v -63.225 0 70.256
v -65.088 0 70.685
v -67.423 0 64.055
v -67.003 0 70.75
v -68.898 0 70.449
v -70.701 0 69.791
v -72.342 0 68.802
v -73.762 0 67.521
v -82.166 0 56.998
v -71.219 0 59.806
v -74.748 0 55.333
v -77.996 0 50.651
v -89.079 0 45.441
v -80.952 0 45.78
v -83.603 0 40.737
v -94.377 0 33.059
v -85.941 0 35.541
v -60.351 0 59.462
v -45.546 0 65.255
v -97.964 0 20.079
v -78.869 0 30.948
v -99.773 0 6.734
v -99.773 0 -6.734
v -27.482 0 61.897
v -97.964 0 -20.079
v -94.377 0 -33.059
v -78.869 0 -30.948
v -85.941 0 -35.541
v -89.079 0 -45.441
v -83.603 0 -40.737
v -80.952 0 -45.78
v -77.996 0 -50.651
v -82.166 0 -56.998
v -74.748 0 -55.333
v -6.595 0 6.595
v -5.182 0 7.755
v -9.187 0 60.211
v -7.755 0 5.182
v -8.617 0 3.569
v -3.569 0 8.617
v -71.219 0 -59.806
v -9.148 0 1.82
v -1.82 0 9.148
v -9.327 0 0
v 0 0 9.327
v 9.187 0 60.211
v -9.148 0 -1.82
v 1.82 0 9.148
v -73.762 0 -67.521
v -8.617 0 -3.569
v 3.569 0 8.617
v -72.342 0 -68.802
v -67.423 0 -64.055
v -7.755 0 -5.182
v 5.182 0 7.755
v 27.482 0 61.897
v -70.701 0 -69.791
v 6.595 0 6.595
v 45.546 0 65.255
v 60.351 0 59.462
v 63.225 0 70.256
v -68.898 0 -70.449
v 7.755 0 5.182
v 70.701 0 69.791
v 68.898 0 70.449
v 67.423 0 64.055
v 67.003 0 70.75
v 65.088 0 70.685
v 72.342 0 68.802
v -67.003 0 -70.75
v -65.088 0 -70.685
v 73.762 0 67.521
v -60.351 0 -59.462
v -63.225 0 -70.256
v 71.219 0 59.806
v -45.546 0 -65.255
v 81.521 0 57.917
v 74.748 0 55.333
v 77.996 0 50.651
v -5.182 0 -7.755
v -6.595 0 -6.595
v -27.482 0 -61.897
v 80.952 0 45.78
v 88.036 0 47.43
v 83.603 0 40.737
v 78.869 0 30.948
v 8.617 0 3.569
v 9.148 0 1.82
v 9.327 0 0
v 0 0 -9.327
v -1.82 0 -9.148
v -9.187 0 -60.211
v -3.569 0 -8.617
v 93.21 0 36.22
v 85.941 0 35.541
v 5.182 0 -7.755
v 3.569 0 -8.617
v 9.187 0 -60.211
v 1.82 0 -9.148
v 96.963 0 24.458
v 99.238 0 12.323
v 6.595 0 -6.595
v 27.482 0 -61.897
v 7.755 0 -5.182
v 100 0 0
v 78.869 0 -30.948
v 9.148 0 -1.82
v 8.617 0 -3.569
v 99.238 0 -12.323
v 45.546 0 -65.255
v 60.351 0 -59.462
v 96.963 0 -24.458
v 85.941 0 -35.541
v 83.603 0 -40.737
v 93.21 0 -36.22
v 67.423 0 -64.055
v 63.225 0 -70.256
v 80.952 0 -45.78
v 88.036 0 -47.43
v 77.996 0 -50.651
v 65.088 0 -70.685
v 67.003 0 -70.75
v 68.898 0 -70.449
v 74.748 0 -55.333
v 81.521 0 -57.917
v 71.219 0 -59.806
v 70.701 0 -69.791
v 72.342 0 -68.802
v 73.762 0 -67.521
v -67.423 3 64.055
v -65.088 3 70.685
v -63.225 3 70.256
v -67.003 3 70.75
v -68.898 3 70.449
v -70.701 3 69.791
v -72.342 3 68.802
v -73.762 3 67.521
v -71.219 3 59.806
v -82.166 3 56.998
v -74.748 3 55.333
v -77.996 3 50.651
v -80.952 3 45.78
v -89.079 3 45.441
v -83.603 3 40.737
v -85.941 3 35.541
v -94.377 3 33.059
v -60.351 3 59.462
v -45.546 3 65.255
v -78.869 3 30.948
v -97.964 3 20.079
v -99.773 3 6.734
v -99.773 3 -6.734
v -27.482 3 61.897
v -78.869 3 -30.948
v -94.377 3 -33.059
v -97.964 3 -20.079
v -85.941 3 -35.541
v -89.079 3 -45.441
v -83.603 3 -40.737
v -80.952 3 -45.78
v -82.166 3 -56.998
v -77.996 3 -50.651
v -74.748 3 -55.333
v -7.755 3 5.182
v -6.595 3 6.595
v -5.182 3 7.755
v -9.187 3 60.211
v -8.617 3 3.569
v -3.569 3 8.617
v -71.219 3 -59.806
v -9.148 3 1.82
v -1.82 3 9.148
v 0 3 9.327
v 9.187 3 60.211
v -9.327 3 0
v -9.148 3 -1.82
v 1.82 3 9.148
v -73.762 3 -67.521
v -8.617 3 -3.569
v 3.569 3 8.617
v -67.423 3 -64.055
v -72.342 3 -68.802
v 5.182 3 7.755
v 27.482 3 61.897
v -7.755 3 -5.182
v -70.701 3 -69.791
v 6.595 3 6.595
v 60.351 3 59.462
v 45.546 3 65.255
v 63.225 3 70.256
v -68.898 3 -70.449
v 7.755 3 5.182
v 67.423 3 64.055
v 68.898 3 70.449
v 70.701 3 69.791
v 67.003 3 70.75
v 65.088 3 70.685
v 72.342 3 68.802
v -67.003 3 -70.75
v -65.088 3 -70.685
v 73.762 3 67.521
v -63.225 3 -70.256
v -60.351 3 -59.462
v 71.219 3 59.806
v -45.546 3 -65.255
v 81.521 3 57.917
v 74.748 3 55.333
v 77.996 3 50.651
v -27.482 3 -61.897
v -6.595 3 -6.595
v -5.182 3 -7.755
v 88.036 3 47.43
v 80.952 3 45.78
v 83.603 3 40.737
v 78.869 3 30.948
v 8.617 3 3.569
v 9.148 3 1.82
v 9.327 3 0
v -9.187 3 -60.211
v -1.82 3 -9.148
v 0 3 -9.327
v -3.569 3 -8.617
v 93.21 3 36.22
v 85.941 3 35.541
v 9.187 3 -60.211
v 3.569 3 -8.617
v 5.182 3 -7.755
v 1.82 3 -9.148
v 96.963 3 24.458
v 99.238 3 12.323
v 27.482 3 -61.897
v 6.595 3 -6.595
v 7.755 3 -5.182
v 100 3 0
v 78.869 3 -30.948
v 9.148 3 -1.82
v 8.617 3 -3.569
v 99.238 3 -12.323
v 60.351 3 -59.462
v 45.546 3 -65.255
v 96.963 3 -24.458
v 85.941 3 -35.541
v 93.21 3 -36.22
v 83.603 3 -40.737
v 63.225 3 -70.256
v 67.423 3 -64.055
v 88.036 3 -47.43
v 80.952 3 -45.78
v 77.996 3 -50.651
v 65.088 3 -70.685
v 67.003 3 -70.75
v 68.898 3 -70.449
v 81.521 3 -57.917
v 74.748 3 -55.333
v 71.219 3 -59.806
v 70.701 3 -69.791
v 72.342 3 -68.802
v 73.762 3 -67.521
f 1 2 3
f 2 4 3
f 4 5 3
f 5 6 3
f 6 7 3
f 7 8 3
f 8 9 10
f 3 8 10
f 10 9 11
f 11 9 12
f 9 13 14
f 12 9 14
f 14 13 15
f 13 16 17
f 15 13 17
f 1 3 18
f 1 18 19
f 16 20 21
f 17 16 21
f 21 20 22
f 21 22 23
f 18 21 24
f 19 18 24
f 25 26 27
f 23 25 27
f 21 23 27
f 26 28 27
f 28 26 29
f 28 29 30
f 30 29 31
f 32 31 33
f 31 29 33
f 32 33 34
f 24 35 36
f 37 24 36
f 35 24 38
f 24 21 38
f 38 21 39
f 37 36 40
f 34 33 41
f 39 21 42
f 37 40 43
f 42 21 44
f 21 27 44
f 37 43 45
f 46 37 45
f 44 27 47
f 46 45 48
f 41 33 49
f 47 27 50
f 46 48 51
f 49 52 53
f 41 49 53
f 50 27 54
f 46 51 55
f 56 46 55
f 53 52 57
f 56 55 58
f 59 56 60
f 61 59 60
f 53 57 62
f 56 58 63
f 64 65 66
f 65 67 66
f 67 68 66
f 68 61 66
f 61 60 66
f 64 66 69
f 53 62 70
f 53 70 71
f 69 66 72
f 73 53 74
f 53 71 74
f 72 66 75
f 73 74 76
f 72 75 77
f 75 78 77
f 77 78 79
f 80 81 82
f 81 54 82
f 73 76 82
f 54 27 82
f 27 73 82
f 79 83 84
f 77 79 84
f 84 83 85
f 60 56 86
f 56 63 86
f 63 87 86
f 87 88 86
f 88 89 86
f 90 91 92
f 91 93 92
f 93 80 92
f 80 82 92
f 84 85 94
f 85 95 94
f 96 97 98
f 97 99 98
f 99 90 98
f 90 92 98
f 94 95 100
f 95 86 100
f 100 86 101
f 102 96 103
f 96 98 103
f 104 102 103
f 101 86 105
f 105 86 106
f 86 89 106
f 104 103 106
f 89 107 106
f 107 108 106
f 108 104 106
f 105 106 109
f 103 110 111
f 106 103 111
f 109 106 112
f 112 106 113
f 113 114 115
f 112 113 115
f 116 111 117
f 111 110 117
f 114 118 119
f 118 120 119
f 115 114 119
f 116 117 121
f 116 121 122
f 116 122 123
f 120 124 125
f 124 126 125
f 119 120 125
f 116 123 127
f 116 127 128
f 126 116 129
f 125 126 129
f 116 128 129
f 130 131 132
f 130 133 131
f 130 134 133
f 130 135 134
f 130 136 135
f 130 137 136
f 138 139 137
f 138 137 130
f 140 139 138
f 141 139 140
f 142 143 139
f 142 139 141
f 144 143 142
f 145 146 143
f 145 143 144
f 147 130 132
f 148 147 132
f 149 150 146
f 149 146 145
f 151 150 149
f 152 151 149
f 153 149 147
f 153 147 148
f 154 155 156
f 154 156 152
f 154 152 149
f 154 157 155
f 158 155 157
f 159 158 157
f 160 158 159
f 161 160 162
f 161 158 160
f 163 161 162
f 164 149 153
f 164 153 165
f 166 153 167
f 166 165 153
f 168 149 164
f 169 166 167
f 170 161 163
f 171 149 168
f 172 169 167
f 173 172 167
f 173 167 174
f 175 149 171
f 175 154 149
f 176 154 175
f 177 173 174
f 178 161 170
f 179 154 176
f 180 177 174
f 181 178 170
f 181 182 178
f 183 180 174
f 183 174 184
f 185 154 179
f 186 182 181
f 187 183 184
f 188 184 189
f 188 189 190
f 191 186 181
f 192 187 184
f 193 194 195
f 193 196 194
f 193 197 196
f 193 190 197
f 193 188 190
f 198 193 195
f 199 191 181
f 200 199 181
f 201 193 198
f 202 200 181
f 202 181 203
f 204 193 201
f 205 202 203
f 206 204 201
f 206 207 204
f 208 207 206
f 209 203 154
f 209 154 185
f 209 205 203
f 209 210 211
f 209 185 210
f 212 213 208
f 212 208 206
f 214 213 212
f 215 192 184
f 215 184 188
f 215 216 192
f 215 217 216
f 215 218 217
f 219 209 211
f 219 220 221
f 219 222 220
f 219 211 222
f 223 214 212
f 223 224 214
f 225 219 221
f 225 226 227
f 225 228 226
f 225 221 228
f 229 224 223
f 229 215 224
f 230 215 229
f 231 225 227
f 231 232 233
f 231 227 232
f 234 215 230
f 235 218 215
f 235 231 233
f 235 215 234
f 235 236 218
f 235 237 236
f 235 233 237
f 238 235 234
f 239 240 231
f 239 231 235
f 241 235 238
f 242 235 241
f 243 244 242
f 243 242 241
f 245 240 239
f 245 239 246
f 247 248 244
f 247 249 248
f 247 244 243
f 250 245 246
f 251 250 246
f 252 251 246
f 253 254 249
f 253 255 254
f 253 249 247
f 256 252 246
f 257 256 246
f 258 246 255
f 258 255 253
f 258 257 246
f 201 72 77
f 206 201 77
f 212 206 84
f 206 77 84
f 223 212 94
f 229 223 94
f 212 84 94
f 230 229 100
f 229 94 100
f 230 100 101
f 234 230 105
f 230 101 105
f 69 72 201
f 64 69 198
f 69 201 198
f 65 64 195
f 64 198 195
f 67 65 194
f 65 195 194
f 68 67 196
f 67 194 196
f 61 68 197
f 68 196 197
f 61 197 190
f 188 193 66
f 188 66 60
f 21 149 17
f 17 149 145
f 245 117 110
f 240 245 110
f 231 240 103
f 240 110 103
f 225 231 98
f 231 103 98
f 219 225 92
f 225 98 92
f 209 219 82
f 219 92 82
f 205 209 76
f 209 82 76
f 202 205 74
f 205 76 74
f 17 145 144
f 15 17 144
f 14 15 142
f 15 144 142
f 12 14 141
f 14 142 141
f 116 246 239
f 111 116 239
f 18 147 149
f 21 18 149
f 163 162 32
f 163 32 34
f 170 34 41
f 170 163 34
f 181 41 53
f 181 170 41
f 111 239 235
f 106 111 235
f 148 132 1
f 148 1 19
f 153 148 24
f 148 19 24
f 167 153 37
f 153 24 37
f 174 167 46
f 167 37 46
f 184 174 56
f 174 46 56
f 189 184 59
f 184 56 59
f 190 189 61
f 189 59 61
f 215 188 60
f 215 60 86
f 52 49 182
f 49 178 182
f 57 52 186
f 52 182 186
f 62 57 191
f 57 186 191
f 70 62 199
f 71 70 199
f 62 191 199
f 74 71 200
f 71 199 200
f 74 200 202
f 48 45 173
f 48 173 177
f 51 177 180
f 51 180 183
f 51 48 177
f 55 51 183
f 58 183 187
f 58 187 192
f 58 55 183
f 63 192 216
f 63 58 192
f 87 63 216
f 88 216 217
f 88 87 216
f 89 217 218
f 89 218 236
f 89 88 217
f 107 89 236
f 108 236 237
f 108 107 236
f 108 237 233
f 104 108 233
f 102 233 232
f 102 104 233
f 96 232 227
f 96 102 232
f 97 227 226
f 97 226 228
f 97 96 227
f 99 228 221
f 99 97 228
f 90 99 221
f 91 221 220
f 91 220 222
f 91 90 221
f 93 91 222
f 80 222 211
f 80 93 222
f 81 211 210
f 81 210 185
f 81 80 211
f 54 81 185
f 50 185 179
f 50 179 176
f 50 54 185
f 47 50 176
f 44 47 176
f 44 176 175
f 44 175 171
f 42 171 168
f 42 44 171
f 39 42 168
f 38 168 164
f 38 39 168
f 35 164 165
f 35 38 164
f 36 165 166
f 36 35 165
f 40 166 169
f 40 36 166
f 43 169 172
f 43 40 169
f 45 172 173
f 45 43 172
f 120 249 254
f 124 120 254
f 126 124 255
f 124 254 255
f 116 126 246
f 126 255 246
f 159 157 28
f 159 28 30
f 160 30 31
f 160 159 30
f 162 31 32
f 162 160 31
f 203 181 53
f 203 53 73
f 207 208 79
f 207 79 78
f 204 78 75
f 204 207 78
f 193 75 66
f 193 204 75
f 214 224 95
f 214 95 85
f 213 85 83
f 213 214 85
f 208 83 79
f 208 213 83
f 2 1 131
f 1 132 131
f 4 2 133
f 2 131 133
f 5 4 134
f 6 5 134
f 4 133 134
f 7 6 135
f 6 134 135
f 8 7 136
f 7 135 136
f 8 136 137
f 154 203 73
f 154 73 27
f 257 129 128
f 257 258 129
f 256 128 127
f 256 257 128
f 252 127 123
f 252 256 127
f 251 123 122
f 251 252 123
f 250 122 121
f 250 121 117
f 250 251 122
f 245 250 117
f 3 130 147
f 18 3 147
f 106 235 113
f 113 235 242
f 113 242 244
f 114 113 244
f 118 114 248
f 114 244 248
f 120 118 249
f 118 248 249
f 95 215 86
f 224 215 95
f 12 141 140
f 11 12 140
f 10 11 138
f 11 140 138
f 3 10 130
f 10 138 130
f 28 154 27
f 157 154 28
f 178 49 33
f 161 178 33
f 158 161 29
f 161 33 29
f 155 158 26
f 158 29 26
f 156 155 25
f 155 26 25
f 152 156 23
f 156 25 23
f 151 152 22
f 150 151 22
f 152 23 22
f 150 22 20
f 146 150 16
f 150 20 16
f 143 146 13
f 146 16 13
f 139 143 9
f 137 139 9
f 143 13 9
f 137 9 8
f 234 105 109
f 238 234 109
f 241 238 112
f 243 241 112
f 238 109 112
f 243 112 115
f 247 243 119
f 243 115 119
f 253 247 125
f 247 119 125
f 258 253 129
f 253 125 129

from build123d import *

# Parameters (mm, degrees)
ESBO_O1_R                = 9.327345029
RESSALTO_EXTRUS_O1_DEPTH = 3
CORTE_EXTRUS_O1_DEPTH    = 124.439873489
FILETE1_R                = 10
ESPELHAR2_COPY_1_DEPTH   = 124.439873489


with BuildPart() as part:
    # Esboço1 → Ressalto-extrusão1 (new body)
    with BuildSketch(Plane(origin=(0, 0, 0), x_dir=(1, 0, 0), z_dir=(0, 1, 0))):
        with BuildLine():
            ThreePointArc((69.076751756, -72.307692308), (91.944752911, -39.321271752), (100, 0))
            ThreePointArc((100, 0), (91.944752911, 39.321271752), (69.076751756, 72.307692308))
            ThreePointArc((69.076751756, 72.307692308), (0, 60), (-69.076751756, 72.307692308))
            ThreePointArc((-69.076751756, 72.307692308), (-100, 0), (-69.076751756, -72.307692308))
            ThreePointArc((-69.076751756, -72.307692308), (0, -60), (69.076751756, -72.307692308))
        make_face()
        with Locations(Location((0, 0, 0), (0, 0, 270))):
            Circle(ESBO_O1_R, mode=Mode.SUBTRACT)
    extrude(amount=RESSALTO_EXTRUS_O1_DEPTH)

    # Esboço2 → Corte-extrusão1 (cut, through all)
    with BuildSketch(Plane(origin=(0, 3, 0), x_dir=(1, 0, 0), z_dir=(0, 1, 0))):
        with BuildLine():
            Line((60.350793544, 59.462439561), (78.868520735, 30.947640251))
            Line((78.868520735, 30.947640251), (85.941059495, 35.540600625))
            ThreePointArc((85.941059495, 35.540600625), (82.316182531, 43.278702541), (77.996362885, 50.651430155))
            ThreePointArc((77.996362885, 50.651430155), (73.018069946, 57.596540359), (67.423332305, 64.055399936))
            Line((67.423332305, 64.055399936), (60.350793544, 59.462439561))
        make_face()
    corte_extrus_o1 = extrude(amount=-CORTE_EXTRUS_O1_DEPTH, mode=Mode.SUBTRACT)

    # Filete1
    filete1_edges = [part.edges().sort_by_distance(p)[0] for p in [
        (-69.076751756, 1.5, -72.307692308),
        (69.076751756, 1.5, -72.307692308),
        (69.076751756, 1.5, 72.307692308),
        (-69.076751756, 1.5, 72.307692308),
    ]]
    fillet(filete1_edges, radius=FILETE1_R)

    # Espelhar1: Corte-extrusão1 across plane
    add(corte_extrus_o1.mirror(Plane(origin=(0, 0, 0), x_dir=(0, 0, 1), z_dir=(1, 0, 0))), mode=Mode.SUBTRACT)

    # Espelhar2: Corte-extrusão1 across plane
    add(corte_extrus_o1.mirror(Plane.XY), mode=Mode.SUBTRACT)

    # Espelhar2 copy 1 sketch → Espelhar2 copy 1 (cut, through all)
    with BuildSketch(Plane(origin=(0, 3, 0), x_dir=(-1, 0, 0), z_dir=(0, 1, 0))):
        with BuildLine():
            Line((60.350793544, 59.462439561), (78.868520735, 30.947640251))
            Line((78.868520735, 30.947640251), (85.941059495, 35.540600625))
            ThreePointArc((85.941059495, 35.540600625), (82.316182531, 43.278702541), (77.996362885, 50.651430155))
            ThreePointArc((77.996362885, 50.651430155), (73.018069946, 57.596540359), (67.423332305, 64.055399936))
            Line((67.423332305, 64.055399936), (60.350793544, 59.462439561))
        make_face()
    extrude(amount=-ESPELHAR2_COPY_1_DEPTH, mode=Mode.SUBTRACT)


solid = part.part
